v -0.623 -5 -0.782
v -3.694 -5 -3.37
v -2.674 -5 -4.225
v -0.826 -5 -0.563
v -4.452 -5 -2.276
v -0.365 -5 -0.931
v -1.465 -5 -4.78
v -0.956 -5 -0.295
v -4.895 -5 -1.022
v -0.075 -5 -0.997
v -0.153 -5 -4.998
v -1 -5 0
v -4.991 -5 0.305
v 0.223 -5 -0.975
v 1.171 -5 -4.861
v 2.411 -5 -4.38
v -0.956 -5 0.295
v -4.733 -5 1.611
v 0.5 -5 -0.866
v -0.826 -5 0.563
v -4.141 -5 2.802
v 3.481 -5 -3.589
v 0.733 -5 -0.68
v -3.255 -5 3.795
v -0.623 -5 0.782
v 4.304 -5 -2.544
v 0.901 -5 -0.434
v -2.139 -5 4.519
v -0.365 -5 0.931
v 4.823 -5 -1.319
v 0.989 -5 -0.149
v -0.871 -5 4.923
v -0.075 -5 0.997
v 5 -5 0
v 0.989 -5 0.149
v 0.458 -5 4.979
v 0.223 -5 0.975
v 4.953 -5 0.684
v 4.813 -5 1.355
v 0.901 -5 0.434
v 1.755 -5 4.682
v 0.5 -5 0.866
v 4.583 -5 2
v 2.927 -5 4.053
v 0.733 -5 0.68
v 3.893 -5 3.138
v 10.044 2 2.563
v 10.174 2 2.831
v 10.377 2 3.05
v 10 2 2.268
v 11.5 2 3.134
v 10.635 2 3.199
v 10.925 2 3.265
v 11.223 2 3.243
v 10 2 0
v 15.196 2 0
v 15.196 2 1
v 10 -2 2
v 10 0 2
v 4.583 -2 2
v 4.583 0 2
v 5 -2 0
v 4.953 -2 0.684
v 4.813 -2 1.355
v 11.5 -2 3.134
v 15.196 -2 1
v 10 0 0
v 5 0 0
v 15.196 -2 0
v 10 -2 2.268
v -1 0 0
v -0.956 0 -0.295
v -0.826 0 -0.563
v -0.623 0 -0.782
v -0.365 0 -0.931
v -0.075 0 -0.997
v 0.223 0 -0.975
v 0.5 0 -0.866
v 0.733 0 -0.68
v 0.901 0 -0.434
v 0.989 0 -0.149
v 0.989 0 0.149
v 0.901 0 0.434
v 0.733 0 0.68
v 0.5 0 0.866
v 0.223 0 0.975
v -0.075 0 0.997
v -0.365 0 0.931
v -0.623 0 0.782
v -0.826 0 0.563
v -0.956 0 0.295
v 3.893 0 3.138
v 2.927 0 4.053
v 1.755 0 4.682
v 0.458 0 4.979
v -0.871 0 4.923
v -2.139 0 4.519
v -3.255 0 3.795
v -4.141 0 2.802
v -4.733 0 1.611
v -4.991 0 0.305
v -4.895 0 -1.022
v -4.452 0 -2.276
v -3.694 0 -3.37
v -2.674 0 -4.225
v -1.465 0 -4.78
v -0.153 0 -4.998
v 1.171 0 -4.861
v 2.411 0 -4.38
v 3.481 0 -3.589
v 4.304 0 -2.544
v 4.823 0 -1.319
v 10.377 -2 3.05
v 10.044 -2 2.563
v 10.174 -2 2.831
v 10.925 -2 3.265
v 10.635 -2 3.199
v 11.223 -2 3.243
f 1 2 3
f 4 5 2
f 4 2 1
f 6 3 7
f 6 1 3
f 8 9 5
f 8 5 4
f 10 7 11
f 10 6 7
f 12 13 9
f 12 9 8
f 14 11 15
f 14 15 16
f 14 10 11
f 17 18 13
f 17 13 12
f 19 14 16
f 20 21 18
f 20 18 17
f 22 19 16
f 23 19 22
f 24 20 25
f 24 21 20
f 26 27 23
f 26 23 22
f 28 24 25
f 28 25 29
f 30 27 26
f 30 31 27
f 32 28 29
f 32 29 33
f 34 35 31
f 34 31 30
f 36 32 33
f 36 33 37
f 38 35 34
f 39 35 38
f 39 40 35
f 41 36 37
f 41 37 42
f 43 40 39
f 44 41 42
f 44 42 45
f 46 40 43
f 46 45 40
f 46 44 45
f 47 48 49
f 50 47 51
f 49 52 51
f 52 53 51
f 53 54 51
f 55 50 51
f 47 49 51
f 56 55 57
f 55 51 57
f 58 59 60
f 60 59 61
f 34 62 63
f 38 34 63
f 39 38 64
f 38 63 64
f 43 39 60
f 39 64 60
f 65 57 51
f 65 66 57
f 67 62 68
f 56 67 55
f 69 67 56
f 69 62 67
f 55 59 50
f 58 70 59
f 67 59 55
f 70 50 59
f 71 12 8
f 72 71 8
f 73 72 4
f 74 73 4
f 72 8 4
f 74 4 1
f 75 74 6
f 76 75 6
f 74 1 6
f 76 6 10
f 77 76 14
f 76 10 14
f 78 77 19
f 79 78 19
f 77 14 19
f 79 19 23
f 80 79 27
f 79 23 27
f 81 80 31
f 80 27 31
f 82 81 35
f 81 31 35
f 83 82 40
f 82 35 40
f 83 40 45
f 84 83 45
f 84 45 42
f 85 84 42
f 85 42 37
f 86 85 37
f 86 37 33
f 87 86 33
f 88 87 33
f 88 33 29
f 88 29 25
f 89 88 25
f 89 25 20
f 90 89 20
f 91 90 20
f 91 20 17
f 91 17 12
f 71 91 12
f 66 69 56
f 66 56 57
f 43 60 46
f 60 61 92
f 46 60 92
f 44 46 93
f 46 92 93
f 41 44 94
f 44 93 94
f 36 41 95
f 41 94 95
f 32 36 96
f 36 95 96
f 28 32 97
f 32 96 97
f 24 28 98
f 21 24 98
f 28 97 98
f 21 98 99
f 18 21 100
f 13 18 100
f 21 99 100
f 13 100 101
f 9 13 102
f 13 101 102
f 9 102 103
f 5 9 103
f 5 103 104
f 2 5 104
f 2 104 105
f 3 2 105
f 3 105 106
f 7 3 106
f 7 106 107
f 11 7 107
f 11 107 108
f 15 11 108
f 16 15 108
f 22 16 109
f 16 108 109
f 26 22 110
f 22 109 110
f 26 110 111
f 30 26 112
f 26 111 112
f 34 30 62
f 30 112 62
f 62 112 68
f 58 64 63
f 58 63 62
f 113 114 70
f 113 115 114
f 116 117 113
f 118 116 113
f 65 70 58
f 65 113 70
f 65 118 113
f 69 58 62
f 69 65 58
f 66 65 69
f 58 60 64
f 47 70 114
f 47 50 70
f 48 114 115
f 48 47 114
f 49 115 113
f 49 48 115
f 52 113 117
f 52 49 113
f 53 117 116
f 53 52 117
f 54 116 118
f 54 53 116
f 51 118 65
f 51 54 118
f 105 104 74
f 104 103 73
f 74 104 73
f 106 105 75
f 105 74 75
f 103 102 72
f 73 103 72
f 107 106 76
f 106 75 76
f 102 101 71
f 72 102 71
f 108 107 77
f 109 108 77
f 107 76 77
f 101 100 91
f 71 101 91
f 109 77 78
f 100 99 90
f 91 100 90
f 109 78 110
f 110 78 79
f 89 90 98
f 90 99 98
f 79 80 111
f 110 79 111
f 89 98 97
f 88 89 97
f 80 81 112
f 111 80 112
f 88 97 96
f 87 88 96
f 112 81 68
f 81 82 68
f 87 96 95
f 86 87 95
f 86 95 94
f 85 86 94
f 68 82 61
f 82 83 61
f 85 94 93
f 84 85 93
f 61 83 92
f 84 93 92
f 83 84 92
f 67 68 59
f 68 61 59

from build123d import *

# Parameters (mm, degrees)
F1_DEPTH = 5
F2_DEPTH = 2
F3_DEPTH = 2
F4_D     = 2
F5_R     = 1


with BuildPart() as f1:
    # F0 (on Front) → F1 (new body)
    with BuildSketch(Plane.XZ):
        with BuildLine():
            ThreePointArc((4.582576, 2), (-4.894532, -1.021548), (5, 0))
            ThreePointArc((5, 0), (4.894532, 1.021548), (4.582576, 2))
        make_face()
    extrude(amount=F1_DEPTH)

    # F0 (on Front) → F2 (join)
    with BuildSketch(Plane.XZ):
        with BuildLine():
            ThreePointArc((4.582576, 2), (4.894532, 1.021548), (5, 0))
            Line((5, 0), (10, 0))
            Line((10, 0), (10, 2))
            Line((10, 2), (4.582576, 2))
        make_face()
    extrude(amount=F2_DEPTH)

    # F0 (on Front) → F3 (join, symmetric)
    with BuildSketch(Plane.XZ):
        Polygon((10, 2), (10, 0), (15.196152, 0), (15.196152, 1), (10, 4), align=None)
    extrude(amount=F3_DEPTH, both=True)

    # F4 (through all)
    with Locations(Plane(origin=(0, 0, 0), x_dir=(1, 0, 0), z_dir=(0, 1, 0))):
        with Locations((0, 0)):
            Hole(F4_D / 2)

    # F5
    f5_edges = [f1.edges().sort_by_distance(p)[0] for p in [
        (10, 0, 4),
    ]]
    fillet(f5_edges, radius=F5_R)


solid = f1.part
